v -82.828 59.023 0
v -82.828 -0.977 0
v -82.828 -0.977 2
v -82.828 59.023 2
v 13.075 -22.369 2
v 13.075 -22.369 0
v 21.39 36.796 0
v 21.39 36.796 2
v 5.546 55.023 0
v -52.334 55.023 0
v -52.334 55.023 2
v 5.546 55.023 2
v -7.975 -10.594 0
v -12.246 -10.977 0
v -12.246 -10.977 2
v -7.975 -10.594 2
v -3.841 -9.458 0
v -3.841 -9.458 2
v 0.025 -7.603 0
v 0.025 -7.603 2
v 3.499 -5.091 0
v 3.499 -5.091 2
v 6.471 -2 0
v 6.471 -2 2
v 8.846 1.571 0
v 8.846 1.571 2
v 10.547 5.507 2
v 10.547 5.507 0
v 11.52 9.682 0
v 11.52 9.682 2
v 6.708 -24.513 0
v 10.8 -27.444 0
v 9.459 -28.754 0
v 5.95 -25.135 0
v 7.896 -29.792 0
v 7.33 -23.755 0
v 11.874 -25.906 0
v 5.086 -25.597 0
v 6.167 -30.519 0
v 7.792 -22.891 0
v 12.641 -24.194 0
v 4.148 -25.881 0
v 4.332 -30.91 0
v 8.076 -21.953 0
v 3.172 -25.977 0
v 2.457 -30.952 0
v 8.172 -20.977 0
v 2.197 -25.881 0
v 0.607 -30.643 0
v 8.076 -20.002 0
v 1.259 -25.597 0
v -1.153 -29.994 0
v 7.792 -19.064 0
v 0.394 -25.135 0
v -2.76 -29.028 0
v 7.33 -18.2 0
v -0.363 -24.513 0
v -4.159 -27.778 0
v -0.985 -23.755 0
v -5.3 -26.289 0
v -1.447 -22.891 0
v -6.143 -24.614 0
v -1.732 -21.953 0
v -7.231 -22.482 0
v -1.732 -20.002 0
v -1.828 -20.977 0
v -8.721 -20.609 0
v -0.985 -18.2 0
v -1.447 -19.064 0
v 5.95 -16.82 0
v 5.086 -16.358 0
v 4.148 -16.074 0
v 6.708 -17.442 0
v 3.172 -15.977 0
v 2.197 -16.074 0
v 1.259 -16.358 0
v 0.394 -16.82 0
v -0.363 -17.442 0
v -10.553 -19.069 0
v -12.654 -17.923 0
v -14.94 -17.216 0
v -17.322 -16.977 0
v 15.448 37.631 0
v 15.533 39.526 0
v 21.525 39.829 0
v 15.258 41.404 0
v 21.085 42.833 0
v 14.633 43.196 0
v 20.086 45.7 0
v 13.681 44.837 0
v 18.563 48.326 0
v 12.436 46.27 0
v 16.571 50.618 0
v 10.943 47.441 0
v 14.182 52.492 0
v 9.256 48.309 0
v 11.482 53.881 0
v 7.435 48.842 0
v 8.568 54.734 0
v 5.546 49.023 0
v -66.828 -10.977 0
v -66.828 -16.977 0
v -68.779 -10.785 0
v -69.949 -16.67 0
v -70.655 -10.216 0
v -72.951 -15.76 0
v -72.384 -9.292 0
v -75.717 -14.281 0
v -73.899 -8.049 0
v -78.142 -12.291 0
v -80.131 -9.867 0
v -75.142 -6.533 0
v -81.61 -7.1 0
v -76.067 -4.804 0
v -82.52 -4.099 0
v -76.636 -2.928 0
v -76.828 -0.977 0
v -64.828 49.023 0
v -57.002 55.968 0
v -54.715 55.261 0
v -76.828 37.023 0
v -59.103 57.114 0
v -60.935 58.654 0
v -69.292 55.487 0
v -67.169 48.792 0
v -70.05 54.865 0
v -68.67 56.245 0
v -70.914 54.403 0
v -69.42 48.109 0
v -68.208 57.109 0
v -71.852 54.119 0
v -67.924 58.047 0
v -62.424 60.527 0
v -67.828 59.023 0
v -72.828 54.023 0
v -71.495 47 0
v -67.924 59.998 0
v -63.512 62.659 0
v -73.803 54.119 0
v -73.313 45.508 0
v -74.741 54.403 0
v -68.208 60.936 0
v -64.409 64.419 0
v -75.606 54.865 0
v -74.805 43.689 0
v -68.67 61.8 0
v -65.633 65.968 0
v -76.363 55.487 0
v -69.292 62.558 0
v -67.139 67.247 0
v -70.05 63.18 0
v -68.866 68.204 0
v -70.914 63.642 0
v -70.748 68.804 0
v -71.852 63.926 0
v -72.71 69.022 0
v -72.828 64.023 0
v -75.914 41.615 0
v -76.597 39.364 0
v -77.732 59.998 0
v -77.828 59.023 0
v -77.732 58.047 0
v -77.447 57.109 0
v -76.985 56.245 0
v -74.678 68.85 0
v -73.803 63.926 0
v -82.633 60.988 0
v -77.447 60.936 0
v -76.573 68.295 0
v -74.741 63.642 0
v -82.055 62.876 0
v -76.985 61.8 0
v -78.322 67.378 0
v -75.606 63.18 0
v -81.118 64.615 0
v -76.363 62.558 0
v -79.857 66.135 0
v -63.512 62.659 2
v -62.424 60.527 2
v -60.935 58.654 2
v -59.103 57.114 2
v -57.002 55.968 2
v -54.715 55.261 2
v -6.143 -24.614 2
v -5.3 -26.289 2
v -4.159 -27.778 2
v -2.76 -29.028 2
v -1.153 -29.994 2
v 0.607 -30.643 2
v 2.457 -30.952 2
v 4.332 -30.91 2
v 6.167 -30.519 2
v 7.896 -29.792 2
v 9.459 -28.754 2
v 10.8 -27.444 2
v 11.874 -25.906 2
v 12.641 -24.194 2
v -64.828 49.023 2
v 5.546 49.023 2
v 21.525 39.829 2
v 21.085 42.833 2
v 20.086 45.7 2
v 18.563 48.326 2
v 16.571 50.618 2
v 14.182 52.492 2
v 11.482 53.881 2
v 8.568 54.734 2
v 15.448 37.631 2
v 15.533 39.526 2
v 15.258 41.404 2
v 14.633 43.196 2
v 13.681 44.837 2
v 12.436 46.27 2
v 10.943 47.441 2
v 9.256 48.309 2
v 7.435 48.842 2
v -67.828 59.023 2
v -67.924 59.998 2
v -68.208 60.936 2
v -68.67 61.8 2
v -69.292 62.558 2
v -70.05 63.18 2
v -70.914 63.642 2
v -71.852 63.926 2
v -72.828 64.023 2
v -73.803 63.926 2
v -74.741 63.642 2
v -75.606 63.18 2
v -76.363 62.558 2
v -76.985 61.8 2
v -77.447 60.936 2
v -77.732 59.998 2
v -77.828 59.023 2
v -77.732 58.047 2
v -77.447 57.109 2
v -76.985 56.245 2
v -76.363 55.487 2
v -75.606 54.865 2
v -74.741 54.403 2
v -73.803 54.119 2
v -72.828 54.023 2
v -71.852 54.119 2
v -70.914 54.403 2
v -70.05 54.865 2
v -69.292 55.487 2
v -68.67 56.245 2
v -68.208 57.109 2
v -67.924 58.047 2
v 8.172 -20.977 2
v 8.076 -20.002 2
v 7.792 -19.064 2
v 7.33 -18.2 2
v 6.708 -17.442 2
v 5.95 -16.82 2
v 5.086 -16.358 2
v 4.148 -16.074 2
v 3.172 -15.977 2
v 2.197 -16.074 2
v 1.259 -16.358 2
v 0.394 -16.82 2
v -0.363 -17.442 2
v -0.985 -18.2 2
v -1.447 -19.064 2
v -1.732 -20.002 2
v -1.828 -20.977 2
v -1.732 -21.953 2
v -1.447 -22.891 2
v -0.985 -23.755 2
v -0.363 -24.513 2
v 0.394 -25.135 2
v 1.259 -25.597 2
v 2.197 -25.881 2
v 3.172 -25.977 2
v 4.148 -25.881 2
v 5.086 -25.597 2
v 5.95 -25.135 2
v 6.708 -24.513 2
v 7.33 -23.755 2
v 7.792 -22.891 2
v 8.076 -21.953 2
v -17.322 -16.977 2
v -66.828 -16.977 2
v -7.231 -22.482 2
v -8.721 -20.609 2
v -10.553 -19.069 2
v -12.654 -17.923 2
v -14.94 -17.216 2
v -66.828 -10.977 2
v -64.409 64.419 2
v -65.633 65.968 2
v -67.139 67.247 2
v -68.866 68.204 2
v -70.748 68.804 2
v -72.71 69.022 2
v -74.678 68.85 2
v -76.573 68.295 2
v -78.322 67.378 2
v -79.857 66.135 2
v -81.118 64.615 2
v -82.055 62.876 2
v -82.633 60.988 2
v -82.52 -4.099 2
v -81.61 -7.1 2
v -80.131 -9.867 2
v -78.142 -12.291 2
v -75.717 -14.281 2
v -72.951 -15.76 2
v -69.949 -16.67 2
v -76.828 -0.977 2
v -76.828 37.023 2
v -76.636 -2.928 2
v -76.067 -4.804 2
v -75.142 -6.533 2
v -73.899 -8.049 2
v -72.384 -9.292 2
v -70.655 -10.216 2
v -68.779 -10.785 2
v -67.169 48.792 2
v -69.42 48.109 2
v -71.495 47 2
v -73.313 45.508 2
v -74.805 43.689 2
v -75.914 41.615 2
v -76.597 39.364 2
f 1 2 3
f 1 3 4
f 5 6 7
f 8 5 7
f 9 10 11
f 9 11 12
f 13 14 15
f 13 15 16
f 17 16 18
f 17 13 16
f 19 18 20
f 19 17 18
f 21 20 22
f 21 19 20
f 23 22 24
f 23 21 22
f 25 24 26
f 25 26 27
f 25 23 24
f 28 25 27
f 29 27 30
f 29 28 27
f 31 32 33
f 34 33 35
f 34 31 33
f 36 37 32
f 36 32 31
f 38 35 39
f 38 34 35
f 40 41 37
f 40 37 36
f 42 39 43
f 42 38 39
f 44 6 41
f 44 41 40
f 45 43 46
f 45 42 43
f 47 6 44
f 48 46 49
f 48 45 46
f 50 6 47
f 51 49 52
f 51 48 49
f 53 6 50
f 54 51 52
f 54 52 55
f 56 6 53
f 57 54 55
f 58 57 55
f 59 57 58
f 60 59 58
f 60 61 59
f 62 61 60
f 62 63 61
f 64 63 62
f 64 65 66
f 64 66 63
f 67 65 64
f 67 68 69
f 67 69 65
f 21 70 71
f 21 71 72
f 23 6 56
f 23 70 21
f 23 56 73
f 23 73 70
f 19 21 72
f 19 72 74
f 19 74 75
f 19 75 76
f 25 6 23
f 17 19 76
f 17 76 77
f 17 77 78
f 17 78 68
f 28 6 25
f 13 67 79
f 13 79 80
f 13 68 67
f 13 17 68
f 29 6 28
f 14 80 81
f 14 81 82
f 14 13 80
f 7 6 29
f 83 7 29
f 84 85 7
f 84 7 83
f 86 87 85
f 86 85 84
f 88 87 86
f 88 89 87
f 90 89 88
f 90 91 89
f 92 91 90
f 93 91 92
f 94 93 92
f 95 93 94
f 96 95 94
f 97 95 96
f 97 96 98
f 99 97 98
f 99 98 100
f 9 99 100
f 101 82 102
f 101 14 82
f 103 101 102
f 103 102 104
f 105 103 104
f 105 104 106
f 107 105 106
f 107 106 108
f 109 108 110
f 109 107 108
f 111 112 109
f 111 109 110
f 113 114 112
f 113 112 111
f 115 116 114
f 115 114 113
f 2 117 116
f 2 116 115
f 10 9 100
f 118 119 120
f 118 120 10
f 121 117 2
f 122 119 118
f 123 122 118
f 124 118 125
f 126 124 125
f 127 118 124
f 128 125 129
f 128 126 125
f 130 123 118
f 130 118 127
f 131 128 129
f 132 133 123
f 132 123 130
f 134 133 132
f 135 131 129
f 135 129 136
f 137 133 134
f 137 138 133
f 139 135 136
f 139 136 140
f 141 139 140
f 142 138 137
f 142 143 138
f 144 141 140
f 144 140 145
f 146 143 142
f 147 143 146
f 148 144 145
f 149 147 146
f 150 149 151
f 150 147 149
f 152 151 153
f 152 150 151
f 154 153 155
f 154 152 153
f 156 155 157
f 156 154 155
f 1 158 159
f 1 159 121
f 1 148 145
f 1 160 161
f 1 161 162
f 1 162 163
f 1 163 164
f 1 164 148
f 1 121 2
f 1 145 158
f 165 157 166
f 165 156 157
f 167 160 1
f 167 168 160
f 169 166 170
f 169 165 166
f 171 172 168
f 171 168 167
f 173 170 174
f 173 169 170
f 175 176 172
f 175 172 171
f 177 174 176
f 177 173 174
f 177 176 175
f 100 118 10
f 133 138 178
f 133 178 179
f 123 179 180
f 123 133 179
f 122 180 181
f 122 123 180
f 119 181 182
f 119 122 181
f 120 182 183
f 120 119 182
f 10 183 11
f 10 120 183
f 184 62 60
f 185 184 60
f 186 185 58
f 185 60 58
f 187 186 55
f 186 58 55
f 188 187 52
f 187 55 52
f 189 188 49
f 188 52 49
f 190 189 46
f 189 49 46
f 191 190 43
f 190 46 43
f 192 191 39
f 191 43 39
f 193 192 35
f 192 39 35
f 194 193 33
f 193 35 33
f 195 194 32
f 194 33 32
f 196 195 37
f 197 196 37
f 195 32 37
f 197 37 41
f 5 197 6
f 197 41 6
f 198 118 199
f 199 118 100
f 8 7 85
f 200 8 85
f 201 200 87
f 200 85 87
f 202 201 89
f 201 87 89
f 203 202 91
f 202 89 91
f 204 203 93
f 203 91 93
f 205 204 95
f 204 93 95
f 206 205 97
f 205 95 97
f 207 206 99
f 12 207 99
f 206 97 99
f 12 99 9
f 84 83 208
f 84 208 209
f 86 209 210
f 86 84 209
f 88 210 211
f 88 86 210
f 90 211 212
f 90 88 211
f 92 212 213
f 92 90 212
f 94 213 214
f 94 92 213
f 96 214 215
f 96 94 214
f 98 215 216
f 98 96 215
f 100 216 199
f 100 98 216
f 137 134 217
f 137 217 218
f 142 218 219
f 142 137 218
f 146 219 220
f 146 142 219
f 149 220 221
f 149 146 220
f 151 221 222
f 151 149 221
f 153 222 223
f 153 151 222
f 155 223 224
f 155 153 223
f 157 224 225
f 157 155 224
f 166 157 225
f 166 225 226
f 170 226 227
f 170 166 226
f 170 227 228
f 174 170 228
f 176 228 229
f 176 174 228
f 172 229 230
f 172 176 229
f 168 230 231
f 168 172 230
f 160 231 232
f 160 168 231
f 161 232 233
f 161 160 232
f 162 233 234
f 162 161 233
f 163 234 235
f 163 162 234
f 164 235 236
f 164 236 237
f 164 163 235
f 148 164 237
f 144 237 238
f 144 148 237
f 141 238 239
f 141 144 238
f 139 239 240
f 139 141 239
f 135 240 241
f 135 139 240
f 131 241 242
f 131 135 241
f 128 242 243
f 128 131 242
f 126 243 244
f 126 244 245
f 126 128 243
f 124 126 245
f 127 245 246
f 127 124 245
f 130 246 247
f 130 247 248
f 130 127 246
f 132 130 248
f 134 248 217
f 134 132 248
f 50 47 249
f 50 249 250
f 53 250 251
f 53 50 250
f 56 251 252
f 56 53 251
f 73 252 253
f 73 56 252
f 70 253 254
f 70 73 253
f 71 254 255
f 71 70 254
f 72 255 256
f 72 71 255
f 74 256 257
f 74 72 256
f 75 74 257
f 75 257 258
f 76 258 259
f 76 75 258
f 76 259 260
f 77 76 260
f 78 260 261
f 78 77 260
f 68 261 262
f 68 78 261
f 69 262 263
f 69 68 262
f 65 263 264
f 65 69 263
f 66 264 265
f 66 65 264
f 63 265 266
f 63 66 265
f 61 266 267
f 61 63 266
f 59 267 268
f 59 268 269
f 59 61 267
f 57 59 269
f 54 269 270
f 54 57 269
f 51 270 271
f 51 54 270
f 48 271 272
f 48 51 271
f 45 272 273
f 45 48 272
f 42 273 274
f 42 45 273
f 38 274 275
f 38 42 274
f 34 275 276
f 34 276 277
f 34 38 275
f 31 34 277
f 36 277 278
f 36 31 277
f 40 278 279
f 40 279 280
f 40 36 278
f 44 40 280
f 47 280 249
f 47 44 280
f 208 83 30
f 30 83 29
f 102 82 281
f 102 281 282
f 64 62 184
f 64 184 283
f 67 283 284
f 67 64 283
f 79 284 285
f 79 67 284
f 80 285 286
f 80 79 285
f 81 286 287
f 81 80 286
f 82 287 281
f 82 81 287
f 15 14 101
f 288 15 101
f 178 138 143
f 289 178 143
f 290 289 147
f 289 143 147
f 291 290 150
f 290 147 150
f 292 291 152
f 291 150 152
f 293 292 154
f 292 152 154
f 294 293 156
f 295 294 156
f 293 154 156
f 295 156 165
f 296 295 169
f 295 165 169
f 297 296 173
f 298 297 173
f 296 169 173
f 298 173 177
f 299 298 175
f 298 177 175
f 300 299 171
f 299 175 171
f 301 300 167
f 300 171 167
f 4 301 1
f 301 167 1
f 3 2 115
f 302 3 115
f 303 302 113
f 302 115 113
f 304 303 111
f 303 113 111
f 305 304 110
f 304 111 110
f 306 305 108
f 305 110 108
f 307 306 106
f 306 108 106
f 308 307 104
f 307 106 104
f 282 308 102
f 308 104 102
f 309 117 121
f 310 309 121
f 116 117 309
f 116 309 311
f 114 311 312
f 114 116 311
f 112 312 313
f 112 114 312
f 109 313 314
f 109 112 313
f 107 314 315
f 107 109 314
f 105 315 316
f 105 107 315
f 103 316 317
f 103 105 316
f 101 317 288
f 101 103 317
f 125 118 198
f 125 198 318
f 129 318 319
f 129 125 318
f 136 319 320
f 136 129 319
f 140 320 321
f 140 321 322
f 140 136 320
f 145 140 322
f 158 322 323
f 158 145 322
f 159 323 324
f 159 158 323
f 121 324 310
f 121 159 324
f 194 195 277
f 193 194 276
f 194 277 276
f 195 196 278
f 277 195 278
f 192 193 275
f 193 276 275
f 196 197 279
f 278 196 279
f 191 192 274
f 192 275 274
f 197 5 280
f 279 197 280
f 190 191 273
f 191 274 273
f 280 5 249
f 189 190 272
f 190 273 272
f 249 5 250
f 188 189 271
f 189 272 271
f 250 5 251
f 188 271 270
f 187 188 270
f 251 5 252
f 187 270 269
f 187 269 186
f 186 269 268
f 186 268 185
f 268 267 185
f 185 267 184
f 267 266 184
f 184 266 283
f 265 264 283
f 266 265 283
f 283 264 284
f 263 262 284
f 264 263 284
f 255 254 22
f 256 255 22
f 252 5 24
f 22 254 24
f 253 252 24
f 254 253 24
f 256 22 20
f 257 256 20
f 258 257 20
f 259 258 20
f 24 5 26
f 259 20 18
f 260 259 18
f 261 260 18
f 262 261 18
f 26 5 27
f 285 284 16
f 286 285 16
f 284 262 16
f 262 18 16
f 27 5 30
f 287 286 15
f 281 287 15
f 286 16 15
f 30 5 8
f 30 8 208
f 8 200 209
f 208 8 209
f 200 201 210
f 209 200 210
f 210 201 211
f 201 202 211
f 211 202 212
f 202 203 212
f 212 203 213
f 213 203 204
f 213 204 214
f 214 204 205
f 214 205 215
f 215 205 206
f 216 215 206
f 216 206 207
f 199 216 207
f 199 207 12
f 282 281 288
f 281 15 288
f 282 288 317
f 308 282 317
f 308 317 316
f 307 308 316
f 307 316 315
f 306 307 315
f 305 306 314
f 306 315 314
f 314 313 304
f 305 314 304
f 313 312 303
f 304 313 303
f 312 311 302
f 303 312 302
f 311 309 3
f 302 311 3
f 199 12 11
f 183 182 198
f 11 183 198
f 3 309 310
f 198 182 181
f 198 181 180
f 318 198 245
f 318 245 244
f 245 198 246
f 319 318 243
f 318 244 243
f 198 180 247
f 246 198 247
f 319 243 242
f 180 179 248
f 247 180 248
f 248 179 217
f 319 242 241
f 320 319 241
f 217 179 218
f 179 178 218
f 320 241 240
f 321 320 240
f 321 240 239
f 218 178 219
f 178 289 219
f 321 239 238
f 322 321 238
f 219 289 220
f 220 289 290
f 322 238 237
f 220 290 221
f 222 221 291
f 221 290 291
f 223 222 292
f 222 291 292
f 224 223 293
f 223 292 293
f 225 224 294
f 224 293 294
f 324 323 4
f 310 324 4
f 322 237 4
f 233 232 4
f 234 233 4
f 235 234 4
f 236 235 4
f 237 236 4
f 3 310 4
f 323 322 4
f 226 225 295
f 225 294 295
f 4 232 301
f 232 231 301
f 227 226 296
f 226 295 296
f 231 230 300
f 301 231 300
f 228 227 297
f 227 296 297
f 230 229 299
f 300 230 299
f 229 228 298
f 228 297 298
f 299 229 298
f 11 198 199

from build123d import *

# Parameters (mm, degrees)
SKETCH_R  = 5
PAD_DEPTH = 2


with BuildPart() as part:
    # Sketch → Pad (new body)
    with BuildSketch(Plane.XY):
        with BuildLine():
            Line((-52.333898, 55.022503), (5.545685, 55.022503))
            ThreePointArc((21.389974, 36.795733), (17.621038, 49.519447), (5.545685, 55.022503))
            Line((13.074881, -22.369229), (21.389974, 36.795733))
            ThreePointArc((-6.14321, -24.613861), (4.332293, -30.909979), (13.074881, -22.369229))
            ThreePointArc((-6.14321, -24.613861), (-10.552788, -19.068824), (-17.321701, -16.977497))
            Line((-17.321701, -16.977497), (-66.8278, -16.977497))
            ThreePointArc((-82.8278, -0.977497), (-78.141508, -12.291206), (-66.8278, -16.977497))
            Line((-82.8278, -0.977497), (-82.8278, 59.022503))
            ThreePointArc((-63.51239, 62.658866), (-74.677922, 68.849865), (-82.8278, 59.022503))
            ThreePointArc((-63.51239, 62.658866), (-59.102811, 57.113829), (-52.333898, 55.022503))
        make_face()
        with Locations((3.1722, -20.977497)):
            Circle(SKETCH_R, mode=Mode.SUBTRACT)
        with Locations((-72.8278, 59.022503)):
            Circle(SKETCH_R, mode=Mode.SUBTRACT)
        with BuildLine():
            Line((-64.8278, 49.022503), (5.545685, 49.022503))
            ThreePointArc((15.448366, 37.630771), (13.092781, 45.583093), (5.545685, 49.022503))
            Line((15.448366, 37.630771), (11.520471, 9.682348))
            ThreePointArc((-12.245963, -10.977497), (3.499454, -5.090527), (11.520471, 9.682348))
            Line((-12.245963, -10.977497), (-66.8278, -10.977497))
            ThreePointArc((-76.8278, -0.977497), (-73.898868, -8.048565), (-66.8278, -10.977497))
            Line((-76.8278, -0.977497), (-76.8278, 37.022503))
            ThreePointArc((-64.8278, 49.022503), (-73.313081, 45.507784), (-76.8278, 37.022503))
        make_face(mode=Mode.SUBTRACT)
    extrude(amount=PAD_DEPTH)


solid = part.part
